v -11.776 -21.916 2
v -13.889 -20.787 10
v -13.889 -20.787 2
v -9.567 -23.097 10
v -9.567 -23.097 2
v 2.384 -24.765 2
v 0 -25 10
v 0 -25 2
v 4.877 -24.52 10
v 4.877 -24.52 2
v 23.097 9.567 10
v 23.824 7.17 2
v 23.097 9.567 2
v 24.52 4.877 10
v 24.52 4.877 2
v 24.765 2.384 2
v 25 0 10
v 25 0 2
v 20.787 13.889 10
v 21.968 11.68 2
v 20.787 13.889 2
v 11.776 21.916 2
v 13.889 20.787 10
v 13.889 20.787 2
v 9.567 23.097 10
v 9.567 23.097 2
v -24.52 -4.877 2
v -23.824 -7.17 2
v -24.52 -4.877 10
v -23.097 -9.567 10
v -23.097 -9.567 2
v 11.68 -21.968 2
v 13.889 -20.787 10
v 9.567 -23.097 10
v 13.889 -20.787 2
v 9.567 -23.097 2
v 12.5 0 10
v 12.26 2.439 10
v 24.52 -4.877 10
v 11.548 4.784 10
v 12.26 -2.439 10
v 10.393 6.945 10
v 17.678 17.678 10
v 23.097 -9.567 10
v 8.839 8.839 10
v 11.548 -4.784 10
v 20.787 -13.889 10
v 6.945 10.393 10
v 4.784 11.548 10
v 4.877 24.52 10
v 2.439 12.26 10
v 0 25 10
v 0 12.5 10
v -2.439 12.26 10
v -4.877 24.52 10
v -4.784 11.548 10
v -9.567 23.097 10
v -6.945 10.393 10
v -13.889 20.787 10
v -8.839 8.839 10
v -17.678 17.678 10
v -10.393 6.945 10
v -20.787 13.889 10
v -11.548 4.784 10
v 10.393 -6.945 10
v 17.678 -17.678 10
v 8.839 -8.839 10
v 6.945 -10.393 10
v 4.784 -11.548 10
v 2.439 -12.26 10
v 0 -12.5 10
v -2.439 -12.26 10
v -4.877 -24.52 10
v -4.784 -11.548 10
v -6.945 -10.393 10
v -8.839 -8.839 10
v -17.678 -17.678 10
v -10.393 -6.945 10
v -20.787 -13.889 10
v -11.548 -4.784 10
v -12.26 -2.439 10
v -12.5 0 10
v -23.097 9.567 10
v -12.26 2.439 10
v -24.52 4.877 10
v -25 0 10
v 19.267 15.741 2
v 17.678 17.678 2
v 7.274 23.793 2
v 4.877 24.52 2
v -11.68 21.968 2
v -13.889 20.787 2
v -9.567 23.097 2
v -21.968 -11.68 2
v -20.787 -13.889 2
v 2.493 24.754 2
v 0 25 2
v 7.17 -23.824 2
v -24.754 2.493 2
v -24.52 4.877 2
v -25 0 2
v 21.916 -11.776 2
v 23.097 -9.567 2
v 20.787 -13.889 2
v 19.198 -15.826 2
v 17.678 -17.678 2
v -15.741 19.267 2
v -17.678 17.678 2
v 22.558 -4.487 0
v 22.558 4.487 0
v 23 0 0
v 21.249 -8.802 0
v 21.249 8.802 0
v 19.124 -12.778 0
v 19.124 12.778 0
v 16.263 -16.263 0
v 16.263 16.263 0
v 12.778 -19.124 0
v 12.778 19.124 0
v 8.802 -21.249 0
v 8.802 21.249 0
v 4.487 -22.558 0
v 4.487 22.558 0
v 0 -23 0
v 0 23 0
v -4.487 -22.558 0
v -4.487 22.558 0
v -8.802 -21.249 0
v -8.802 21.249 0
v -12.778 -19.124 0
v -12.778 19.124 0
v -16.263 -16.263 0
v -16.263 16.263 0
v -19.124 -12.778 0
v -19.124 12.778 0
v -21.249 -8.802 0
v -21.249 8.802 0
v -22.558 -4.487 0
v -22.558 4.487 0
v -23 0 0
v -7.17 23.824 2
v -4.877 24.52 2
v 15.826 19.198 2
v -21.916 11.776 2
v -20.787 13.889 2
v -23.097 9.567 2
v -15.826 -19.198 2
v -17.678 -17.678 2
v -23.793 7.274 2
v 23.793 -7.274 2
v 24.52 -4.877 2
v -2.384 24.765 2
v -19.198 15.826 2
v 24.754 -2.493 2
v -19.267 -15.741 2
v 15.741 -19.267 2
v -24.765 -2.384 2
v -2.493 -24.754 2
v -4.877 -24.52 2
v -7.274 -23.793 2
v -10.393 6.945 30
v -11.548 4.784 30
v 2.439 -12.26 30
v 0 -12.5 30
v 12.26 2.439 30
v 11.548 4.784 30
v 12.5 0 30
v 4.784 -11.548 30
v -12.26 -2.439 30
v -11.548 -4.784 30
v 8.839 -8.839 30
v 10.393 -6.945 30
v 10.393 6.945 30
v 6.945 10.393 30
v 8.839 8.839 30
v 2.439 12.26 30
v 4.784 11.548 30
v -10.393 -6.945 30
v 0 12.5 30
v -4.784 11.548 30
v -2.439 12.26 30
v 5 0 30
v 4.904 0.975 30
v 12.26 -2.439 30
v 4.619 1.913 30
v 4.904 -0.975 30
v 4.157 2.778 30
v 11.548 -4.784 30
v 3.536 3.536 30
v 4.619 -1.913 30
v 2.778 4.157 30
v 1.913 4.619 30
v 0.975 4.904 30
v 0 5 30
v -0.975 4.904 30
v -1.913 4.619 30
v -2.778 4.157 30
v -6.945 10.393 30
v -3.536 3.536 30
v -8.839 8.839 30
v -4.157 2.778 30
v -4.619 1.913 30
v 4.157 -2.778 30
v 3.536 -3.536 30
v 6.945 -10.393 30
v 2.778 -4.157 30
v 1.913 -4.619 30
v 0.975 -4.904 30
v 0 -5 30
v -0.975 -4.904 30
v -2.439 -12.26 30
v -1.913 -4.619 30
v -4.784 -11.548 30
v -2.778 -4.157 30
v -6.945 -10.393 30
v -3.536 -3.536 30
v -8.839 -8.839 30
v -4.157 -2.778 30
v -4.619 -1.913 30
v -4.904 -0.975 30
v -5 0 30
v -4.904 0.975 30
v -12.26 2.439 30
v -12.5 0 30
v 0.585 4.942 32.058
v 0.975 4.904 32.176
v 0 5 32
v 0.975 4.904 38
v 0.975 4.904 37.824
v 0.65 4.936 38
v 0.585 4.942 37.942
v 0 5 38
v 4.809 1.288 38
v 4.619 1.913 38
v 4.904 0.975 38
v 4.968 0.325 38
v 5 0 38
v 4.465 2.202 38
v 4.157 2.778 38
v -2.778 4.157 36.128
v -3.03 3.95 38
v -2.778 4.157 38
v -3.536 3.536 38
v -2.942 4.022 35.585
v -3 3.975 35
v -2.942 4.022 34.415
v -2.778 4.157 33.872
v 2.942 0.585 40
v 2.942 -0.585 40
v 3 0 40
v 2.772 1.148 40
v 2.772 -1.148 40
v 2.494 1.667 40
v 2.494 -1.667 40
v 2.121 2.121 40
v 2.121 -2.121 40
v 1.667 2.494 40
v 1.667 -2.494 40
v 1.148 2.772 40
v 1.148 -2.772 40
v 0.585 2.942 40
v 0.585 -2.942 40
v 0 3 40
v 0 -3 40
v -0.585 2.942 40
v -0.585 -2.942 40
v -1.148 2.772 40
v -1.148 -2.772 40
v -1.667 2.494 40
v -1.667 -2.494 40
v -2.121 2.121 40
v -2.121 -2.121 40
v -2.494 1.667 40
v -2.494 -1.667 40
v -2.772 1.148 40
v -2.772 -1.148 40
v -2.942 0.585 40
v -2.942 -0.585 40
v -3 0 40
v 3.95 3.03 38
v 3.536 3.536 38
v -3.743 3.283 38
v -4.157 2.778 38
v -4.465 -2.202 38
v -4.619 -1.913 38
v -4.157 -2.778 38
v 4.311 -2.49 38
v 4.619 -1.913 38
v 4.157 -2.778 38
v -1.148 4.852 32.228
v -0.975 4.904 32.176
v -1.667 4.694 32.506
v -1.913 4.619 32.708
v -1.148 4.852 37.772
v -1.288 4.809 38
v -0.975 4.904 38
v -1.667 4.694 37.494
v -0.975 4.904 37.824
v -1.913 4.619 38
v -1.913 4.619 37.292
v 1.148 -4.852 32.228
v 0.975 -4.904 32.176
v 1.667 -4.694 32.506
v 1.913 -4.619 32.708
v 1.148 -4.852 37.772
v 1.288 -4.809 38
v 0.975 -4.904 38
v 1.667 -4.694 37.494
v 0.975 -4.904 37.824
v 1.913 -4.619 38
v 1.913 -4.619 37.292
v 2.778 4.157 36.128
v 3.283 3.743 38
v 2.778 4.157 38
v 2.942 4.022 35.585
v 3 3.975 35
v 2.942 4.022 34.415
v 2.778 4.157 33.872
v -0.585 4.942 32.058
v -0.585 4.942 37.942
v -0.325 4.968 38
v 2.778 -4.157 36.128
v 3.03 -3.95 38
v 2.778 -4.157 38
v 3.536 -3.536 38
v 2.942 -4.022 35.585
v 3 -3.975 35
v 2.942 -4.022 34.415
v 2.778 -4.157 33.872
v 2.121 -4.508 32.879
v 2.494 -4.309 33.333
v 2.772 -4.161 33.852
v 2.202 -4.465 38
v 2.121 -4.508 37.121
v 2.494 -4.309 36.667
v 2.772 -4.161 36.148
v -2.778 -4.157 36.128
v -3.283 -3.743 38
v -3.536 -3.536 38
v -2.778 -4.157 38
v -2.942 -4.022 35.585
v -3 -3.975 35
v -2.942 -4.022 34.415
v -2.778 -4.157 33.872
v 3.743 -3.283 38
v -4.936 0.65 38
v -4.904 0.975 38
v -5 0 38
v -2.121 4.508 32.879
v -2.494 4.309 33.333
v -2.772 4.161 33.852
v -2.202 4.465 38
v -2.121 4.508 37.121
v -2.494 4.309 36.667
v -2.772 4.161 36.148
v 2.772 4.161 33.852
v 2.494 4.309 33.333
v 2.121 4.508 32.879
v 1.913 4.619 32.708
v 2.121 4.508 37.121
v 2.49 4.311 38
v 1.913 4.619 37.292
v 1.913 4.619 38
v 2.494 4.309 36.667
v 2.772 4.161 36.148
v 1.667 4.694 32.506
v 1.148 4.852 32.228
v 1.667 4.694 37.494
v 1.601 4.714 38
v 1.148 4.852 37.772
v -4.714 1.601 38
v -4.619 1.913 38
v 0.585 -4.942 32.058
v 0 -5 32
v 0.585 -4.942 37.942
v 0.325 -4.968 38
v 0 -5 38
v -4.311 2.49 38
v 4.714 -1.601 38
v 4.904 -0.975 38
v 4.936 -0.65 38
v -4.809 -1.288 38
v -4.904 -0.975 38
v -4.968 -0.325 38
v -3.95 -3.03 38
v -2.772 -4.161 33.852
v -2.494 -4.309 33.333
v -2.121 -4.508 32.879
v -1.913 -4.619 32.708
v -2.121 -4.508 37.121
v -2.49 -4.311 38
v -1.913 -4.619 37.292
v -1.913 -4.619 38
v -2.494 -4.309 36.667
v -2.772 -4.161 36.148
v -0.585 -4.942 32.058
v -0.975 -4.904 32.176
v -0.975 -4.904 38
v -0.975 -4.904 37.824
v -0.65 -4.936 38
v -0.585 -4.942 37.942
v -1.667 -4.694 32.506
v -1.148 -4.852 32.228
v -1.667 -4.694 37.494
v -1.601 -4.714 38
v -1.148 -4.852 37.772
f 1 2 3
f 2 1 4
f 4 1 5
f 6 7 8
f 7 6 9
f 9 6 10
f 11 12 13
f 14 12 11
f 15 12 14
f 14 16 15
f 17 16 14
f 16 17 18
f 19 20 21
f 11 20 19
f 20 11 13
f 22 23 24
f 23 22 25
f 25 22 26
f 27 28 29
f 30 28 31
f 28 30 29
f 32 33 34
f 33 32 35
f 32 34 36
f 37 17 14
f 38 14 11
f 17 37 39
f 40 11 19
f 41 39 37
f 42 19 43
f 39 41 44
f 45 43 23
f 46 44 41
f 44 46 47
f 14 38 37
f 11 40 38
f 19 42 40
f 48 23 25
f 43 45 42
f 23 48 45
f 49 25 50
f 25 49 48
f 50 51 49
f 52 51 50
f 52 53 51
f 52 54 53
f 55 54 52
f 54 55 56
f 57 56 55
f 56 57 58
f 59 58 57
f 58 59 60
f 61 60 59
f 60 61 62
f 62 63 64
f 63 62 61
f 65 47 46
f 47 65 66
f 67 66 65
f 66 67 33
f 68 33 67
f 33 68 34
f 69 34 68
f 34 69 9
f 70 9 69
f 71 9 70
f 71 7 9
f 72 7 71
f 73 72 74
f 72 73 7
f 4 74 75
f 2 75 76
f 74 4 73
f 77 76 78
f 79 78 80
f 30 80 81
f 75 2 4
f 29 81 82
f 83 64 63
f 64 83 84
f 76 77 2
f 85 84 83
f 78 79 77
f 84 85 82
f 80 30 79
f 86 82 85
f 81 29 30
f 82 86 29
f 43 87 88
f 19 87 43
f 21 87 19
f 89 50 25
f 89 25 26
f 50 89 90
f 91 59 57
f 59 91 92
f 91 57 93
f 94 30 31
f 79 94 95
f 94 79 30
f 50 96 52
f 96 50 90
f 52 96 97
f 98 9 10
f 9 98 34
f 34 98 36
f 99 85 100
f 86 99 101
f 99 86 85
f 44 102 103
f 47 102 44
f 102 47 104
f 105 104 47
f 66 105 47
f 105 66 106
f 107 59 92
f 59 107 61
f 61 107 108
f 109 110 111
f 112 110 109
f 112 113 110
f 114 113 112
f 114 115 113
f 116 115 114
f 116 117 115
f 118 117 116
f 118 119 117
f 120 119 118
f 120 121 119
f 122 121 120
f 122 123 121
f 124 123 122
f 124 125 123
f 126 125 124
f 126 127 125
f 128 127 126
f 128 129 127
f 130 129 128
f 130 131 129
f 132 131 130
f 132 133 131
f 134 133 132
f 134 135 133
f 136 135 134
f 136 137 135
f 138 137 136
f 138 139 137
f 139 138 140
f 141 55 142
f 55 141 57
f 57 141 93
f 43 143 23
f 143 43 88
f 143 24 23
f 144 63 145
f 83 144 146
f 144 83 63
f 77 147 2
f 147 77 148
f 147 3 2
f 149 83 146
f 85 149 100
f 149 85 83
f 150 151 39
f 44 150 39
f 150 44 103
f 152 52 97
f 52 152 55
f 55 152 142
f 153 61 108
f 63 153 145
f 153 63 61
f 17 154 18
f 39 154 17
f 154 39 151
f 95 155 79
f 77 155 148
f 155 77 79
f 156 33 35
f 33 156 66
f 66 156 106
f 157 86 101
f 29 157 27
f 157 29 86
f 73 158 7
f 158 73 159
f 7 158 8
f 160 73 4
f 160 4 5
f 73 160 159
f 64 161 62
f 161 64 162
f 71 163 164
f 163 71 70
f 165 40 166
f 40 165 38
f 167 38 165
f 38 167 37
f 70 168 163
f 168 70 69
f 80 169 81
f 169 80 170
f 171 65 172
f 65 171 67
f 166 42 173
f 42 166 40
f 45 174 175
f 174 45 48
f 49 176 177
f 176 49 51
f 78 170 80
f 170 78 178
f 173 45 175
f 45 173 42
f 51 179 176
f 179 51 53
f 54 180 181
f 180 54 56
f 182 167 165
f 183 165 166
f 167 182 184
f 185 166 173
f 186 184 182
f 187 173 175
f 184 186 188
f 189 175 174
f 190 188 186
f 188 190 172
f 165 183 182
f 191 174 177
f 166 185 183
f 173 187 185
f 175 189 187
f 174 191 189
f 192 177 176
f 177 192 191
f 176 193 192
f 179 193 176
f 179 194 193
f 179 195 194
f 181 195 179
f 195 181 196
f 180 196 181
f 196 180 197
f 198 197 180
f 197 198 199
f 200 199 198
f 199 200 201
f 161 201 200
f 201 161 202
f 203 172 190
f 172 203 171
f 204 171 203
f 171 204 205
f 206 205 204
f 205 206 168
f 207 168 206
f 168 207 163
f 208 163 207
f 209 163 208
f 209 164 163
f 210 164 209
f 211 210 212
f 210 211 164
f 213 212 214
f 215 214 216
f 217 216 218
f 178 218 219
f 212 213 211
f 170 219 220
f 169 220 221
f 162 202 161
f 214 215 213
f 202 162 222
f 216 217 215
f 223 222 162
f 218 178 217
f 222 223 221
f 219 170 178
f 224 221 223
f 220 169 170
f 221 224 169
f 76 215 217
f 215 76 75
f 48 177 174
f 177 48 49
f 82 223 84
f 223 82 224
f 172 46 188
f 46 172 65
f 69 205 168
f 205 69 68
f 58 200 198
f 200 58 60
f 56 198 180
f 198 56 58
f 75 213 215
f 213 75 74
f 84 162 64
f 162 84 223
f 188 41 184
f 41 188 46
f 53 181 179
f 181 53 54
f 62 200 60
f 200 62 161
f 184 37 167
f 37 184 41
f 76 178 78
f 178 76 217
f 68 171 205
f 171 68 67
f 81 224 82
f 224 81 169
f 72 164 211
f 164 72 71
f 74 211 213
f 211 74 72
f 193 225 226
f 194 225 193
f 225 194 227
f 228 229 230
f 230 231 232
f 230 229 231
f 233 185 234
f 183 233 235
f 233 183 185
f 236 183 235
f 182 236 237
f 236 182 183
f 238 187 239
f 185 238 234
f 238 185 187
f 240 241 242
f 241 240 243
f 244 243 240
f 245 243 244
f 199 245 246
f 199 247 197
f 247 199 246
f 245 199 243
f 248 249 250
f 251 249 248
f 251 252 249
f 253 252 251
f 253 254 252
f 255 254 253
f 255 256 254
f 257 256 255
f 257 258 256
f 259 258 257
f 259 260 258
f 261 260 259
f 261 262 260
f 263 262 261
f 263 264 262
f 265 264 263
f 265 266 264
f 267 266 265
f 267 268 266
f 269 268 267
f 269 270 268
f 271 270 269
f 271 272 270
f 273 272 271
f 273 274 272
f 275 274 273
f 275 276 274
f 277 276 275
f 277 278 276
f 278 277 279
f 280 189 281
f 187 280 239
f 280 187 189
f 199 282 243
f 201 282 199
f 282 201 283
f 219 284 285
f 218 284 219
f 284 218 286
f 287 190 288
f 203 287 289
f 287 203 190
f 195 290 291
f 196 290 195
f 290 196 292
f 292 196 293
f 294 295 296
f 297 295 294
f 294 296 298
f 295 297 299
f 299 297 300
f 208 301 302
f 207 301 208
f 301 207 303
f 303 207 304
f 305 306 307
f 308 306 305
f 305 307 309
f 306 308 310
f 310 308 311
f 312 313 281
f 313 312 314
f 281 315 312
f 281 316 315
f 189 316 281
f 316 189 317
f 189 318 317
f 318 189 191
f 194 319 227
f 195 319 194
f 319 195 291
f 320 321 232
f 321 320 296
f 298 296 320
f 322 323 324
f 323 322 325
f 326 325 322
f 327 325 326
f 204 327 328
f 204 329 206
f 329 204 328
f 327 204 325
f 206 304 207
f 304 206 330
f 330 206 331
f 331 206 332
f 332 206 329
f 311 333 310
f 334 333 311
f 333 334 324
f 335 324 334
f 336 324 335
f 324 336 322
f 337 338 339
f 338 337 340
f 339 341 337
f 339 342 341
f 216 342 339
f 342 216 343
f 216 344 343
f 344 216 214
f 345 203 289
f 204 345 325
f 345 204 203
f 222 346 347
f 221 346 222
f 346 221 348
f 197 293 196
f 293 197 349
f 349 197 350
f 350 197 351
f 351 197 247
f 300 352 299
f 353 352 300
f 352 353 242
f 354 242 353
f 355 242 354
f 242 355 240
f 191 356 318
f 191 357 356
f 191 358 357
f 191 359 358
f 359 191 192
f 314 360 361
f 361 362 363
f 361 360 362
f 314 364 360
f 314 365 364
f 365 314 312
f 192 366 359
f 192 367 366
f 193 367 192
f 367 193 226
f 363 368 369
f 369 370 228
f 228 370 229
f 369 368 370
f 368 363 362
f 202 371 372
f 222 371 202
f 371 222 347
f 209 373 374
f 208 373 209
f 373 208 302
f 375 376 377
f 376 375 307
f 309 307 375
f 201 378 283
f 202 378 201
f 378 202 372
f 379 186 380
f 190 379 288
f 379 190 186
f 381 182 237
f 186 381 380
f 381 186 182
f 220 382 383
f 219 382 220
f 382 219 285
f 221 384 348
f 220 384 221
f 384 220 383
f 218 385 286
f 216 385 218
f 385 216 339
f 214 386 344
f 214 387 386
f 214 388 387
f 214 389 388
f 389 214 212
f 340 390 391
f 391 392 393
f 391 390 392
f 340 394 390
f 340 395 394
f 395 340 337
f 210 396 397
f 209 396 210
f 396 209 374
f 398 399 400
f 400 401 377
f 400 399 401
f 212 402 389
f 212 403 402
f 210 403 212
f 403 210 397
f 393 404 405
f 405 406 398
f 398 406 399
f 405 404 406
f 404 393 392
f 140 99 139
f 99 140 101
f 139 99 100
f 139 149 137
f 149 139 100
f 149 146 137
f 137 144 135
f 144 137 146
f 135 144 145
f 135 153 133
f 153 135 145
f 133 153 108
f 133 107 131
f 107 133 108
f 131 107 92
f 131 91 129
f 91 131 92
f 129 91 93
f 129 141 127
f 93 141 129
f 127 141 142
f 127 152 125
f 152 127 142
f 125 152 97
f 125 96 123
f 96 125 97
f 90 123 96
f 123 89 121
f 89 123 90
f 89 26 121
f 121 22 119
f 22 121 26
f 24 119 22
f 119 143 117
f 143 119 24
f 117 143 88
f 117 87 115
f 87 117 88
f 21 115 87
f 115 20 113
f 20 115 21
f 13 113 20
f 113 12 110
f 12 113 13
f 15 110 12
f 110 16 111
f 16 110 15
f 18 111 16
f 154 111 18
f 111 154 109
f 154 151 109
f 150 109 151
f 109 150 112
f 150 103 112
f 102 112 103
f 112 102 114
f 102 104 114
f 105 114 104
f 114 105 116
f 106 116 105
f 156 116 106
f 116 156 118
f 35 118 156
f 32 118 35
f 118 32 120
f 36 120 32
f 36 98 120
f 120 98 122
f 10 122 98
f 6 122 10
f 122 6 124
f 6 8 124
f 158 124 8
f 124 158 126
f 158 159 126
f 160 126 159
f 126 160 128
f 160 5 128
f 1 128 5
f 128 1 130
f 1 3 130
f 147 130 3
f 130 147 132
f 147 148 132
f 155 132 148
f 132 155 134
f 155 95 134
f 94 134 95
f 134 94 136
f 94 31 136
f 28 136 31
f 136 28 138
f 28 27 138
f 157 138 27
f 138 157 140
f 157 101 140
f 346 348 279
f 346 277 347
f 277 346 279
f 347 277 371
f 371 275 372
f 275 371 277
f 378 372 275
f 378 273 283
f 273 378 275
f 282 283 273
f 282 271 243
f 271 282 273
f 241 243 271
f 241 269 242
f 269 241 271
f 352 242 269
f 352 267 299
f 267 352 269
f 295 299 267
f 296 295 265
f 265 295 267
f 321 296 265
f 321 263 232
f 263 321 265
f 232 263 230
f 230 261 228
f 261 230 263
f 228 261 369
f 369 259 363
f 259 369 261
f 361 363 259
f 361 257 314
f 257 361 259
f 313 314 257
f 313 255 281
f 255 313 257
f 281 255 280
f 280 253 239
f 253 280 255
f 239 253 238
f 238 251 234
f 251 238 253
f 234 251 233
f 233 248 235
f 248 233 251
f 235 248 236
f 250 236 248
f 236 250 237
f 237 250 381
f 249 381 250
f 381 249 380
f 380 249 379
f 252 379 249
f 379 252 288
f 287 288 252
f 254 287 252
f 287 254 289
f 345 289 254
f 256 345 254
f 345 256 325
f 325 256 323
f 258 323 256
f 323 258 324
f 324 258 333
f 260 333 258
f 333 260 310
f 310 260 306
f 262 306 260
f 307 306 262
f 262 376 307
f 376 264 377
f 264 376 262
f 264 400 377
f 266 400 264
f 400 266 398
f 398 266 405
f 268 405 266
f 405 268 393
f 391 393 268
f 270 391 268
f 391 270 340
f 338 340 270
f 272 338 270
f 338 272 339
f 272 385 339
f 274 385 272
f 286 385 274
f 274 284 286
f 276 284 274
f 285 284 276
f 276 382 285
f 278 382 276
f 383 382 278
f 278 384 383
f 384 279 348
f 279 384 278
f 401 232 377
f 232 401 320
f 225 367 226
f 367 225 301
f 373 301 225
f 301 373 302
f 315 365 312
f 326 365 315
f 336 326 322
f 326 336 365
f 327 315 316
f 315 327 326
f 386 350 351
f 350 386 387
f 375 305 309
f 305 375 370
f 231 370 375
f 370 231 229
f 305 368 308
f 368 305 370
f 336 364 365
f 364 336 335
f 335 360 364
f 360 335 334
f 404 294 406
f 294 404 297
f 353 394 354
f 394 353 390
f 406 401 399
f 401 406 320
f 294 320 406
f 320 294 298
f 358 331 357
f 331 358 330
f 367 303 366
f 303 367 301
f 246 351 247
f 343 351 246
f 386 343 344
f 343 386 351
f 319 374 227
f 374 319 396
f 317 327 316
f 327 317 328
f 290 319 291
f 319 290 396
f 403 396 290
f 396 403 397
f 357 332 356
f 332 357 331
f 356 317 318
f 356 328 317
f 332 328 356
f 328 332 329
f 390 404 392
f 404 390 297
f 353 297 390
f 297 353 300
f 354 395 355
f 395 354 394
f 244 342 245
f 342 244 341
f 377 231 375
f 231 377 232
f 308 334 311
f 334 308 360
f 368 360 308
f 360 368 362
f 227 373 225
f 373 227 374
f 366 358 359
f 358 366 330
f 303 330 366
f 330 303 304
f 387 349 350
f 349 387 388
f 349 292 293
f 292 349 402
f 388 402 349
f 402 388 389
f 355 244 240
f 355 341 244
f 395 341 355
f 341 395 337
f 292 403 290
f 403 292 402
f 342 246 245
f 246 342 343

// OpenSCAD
$fn = 32;

// ----------------------------------------------------------------------
// Stepped shaft: diameters 50, 25, 10 mm, 40 mm long
// ----------------------------------------------------------------------

// --- parameters (mm) ---
d1 = 50;                  // step 1 diameter
len1 = 10;                // step 1 length
d2 = 25;                  // step 2 diameter
len2 = 20;                // step 2 length
d3 = 10;                  // step 3 diameter
len3 = 10;                // step 3 length
total = 40;               // overall length
chamfer = 2;              // end chamfer
cross_d = 6;              // cross pin hole
cross_z = 35;             // cross hole position

difference() {
  /* turned body: stacked cylinders, every step sunk into the bigger one */
  union() {
    cylinder(h = len1, d = d1);
    translate([0, 0, 9.6]) cylinder(h = 20.4, d = d2);
    translate([0, 0, 29.6]) cylinder(h = 10.4, d = d3);
  }
  /* bottom chamfer ring cut */
  rotate_extrude() translate([23, -2.5]) polygon([[0, 0], [4.5, 0], [4.5, 7], [0, 2.5]]);
  /* top chamfer ring cut */
  rotate_extrude() translate([3, 40]) polygon([[0, 0], [4.5, -4.5], [4.5, 2.5], [0, 2.5]]);
  /* cross pin hole through the small step */
  translate([0, 0, cross_z]) rotate([90, 0, 0]) cylinder(h = d3 + 5, d = cross_d, center = true);
}
